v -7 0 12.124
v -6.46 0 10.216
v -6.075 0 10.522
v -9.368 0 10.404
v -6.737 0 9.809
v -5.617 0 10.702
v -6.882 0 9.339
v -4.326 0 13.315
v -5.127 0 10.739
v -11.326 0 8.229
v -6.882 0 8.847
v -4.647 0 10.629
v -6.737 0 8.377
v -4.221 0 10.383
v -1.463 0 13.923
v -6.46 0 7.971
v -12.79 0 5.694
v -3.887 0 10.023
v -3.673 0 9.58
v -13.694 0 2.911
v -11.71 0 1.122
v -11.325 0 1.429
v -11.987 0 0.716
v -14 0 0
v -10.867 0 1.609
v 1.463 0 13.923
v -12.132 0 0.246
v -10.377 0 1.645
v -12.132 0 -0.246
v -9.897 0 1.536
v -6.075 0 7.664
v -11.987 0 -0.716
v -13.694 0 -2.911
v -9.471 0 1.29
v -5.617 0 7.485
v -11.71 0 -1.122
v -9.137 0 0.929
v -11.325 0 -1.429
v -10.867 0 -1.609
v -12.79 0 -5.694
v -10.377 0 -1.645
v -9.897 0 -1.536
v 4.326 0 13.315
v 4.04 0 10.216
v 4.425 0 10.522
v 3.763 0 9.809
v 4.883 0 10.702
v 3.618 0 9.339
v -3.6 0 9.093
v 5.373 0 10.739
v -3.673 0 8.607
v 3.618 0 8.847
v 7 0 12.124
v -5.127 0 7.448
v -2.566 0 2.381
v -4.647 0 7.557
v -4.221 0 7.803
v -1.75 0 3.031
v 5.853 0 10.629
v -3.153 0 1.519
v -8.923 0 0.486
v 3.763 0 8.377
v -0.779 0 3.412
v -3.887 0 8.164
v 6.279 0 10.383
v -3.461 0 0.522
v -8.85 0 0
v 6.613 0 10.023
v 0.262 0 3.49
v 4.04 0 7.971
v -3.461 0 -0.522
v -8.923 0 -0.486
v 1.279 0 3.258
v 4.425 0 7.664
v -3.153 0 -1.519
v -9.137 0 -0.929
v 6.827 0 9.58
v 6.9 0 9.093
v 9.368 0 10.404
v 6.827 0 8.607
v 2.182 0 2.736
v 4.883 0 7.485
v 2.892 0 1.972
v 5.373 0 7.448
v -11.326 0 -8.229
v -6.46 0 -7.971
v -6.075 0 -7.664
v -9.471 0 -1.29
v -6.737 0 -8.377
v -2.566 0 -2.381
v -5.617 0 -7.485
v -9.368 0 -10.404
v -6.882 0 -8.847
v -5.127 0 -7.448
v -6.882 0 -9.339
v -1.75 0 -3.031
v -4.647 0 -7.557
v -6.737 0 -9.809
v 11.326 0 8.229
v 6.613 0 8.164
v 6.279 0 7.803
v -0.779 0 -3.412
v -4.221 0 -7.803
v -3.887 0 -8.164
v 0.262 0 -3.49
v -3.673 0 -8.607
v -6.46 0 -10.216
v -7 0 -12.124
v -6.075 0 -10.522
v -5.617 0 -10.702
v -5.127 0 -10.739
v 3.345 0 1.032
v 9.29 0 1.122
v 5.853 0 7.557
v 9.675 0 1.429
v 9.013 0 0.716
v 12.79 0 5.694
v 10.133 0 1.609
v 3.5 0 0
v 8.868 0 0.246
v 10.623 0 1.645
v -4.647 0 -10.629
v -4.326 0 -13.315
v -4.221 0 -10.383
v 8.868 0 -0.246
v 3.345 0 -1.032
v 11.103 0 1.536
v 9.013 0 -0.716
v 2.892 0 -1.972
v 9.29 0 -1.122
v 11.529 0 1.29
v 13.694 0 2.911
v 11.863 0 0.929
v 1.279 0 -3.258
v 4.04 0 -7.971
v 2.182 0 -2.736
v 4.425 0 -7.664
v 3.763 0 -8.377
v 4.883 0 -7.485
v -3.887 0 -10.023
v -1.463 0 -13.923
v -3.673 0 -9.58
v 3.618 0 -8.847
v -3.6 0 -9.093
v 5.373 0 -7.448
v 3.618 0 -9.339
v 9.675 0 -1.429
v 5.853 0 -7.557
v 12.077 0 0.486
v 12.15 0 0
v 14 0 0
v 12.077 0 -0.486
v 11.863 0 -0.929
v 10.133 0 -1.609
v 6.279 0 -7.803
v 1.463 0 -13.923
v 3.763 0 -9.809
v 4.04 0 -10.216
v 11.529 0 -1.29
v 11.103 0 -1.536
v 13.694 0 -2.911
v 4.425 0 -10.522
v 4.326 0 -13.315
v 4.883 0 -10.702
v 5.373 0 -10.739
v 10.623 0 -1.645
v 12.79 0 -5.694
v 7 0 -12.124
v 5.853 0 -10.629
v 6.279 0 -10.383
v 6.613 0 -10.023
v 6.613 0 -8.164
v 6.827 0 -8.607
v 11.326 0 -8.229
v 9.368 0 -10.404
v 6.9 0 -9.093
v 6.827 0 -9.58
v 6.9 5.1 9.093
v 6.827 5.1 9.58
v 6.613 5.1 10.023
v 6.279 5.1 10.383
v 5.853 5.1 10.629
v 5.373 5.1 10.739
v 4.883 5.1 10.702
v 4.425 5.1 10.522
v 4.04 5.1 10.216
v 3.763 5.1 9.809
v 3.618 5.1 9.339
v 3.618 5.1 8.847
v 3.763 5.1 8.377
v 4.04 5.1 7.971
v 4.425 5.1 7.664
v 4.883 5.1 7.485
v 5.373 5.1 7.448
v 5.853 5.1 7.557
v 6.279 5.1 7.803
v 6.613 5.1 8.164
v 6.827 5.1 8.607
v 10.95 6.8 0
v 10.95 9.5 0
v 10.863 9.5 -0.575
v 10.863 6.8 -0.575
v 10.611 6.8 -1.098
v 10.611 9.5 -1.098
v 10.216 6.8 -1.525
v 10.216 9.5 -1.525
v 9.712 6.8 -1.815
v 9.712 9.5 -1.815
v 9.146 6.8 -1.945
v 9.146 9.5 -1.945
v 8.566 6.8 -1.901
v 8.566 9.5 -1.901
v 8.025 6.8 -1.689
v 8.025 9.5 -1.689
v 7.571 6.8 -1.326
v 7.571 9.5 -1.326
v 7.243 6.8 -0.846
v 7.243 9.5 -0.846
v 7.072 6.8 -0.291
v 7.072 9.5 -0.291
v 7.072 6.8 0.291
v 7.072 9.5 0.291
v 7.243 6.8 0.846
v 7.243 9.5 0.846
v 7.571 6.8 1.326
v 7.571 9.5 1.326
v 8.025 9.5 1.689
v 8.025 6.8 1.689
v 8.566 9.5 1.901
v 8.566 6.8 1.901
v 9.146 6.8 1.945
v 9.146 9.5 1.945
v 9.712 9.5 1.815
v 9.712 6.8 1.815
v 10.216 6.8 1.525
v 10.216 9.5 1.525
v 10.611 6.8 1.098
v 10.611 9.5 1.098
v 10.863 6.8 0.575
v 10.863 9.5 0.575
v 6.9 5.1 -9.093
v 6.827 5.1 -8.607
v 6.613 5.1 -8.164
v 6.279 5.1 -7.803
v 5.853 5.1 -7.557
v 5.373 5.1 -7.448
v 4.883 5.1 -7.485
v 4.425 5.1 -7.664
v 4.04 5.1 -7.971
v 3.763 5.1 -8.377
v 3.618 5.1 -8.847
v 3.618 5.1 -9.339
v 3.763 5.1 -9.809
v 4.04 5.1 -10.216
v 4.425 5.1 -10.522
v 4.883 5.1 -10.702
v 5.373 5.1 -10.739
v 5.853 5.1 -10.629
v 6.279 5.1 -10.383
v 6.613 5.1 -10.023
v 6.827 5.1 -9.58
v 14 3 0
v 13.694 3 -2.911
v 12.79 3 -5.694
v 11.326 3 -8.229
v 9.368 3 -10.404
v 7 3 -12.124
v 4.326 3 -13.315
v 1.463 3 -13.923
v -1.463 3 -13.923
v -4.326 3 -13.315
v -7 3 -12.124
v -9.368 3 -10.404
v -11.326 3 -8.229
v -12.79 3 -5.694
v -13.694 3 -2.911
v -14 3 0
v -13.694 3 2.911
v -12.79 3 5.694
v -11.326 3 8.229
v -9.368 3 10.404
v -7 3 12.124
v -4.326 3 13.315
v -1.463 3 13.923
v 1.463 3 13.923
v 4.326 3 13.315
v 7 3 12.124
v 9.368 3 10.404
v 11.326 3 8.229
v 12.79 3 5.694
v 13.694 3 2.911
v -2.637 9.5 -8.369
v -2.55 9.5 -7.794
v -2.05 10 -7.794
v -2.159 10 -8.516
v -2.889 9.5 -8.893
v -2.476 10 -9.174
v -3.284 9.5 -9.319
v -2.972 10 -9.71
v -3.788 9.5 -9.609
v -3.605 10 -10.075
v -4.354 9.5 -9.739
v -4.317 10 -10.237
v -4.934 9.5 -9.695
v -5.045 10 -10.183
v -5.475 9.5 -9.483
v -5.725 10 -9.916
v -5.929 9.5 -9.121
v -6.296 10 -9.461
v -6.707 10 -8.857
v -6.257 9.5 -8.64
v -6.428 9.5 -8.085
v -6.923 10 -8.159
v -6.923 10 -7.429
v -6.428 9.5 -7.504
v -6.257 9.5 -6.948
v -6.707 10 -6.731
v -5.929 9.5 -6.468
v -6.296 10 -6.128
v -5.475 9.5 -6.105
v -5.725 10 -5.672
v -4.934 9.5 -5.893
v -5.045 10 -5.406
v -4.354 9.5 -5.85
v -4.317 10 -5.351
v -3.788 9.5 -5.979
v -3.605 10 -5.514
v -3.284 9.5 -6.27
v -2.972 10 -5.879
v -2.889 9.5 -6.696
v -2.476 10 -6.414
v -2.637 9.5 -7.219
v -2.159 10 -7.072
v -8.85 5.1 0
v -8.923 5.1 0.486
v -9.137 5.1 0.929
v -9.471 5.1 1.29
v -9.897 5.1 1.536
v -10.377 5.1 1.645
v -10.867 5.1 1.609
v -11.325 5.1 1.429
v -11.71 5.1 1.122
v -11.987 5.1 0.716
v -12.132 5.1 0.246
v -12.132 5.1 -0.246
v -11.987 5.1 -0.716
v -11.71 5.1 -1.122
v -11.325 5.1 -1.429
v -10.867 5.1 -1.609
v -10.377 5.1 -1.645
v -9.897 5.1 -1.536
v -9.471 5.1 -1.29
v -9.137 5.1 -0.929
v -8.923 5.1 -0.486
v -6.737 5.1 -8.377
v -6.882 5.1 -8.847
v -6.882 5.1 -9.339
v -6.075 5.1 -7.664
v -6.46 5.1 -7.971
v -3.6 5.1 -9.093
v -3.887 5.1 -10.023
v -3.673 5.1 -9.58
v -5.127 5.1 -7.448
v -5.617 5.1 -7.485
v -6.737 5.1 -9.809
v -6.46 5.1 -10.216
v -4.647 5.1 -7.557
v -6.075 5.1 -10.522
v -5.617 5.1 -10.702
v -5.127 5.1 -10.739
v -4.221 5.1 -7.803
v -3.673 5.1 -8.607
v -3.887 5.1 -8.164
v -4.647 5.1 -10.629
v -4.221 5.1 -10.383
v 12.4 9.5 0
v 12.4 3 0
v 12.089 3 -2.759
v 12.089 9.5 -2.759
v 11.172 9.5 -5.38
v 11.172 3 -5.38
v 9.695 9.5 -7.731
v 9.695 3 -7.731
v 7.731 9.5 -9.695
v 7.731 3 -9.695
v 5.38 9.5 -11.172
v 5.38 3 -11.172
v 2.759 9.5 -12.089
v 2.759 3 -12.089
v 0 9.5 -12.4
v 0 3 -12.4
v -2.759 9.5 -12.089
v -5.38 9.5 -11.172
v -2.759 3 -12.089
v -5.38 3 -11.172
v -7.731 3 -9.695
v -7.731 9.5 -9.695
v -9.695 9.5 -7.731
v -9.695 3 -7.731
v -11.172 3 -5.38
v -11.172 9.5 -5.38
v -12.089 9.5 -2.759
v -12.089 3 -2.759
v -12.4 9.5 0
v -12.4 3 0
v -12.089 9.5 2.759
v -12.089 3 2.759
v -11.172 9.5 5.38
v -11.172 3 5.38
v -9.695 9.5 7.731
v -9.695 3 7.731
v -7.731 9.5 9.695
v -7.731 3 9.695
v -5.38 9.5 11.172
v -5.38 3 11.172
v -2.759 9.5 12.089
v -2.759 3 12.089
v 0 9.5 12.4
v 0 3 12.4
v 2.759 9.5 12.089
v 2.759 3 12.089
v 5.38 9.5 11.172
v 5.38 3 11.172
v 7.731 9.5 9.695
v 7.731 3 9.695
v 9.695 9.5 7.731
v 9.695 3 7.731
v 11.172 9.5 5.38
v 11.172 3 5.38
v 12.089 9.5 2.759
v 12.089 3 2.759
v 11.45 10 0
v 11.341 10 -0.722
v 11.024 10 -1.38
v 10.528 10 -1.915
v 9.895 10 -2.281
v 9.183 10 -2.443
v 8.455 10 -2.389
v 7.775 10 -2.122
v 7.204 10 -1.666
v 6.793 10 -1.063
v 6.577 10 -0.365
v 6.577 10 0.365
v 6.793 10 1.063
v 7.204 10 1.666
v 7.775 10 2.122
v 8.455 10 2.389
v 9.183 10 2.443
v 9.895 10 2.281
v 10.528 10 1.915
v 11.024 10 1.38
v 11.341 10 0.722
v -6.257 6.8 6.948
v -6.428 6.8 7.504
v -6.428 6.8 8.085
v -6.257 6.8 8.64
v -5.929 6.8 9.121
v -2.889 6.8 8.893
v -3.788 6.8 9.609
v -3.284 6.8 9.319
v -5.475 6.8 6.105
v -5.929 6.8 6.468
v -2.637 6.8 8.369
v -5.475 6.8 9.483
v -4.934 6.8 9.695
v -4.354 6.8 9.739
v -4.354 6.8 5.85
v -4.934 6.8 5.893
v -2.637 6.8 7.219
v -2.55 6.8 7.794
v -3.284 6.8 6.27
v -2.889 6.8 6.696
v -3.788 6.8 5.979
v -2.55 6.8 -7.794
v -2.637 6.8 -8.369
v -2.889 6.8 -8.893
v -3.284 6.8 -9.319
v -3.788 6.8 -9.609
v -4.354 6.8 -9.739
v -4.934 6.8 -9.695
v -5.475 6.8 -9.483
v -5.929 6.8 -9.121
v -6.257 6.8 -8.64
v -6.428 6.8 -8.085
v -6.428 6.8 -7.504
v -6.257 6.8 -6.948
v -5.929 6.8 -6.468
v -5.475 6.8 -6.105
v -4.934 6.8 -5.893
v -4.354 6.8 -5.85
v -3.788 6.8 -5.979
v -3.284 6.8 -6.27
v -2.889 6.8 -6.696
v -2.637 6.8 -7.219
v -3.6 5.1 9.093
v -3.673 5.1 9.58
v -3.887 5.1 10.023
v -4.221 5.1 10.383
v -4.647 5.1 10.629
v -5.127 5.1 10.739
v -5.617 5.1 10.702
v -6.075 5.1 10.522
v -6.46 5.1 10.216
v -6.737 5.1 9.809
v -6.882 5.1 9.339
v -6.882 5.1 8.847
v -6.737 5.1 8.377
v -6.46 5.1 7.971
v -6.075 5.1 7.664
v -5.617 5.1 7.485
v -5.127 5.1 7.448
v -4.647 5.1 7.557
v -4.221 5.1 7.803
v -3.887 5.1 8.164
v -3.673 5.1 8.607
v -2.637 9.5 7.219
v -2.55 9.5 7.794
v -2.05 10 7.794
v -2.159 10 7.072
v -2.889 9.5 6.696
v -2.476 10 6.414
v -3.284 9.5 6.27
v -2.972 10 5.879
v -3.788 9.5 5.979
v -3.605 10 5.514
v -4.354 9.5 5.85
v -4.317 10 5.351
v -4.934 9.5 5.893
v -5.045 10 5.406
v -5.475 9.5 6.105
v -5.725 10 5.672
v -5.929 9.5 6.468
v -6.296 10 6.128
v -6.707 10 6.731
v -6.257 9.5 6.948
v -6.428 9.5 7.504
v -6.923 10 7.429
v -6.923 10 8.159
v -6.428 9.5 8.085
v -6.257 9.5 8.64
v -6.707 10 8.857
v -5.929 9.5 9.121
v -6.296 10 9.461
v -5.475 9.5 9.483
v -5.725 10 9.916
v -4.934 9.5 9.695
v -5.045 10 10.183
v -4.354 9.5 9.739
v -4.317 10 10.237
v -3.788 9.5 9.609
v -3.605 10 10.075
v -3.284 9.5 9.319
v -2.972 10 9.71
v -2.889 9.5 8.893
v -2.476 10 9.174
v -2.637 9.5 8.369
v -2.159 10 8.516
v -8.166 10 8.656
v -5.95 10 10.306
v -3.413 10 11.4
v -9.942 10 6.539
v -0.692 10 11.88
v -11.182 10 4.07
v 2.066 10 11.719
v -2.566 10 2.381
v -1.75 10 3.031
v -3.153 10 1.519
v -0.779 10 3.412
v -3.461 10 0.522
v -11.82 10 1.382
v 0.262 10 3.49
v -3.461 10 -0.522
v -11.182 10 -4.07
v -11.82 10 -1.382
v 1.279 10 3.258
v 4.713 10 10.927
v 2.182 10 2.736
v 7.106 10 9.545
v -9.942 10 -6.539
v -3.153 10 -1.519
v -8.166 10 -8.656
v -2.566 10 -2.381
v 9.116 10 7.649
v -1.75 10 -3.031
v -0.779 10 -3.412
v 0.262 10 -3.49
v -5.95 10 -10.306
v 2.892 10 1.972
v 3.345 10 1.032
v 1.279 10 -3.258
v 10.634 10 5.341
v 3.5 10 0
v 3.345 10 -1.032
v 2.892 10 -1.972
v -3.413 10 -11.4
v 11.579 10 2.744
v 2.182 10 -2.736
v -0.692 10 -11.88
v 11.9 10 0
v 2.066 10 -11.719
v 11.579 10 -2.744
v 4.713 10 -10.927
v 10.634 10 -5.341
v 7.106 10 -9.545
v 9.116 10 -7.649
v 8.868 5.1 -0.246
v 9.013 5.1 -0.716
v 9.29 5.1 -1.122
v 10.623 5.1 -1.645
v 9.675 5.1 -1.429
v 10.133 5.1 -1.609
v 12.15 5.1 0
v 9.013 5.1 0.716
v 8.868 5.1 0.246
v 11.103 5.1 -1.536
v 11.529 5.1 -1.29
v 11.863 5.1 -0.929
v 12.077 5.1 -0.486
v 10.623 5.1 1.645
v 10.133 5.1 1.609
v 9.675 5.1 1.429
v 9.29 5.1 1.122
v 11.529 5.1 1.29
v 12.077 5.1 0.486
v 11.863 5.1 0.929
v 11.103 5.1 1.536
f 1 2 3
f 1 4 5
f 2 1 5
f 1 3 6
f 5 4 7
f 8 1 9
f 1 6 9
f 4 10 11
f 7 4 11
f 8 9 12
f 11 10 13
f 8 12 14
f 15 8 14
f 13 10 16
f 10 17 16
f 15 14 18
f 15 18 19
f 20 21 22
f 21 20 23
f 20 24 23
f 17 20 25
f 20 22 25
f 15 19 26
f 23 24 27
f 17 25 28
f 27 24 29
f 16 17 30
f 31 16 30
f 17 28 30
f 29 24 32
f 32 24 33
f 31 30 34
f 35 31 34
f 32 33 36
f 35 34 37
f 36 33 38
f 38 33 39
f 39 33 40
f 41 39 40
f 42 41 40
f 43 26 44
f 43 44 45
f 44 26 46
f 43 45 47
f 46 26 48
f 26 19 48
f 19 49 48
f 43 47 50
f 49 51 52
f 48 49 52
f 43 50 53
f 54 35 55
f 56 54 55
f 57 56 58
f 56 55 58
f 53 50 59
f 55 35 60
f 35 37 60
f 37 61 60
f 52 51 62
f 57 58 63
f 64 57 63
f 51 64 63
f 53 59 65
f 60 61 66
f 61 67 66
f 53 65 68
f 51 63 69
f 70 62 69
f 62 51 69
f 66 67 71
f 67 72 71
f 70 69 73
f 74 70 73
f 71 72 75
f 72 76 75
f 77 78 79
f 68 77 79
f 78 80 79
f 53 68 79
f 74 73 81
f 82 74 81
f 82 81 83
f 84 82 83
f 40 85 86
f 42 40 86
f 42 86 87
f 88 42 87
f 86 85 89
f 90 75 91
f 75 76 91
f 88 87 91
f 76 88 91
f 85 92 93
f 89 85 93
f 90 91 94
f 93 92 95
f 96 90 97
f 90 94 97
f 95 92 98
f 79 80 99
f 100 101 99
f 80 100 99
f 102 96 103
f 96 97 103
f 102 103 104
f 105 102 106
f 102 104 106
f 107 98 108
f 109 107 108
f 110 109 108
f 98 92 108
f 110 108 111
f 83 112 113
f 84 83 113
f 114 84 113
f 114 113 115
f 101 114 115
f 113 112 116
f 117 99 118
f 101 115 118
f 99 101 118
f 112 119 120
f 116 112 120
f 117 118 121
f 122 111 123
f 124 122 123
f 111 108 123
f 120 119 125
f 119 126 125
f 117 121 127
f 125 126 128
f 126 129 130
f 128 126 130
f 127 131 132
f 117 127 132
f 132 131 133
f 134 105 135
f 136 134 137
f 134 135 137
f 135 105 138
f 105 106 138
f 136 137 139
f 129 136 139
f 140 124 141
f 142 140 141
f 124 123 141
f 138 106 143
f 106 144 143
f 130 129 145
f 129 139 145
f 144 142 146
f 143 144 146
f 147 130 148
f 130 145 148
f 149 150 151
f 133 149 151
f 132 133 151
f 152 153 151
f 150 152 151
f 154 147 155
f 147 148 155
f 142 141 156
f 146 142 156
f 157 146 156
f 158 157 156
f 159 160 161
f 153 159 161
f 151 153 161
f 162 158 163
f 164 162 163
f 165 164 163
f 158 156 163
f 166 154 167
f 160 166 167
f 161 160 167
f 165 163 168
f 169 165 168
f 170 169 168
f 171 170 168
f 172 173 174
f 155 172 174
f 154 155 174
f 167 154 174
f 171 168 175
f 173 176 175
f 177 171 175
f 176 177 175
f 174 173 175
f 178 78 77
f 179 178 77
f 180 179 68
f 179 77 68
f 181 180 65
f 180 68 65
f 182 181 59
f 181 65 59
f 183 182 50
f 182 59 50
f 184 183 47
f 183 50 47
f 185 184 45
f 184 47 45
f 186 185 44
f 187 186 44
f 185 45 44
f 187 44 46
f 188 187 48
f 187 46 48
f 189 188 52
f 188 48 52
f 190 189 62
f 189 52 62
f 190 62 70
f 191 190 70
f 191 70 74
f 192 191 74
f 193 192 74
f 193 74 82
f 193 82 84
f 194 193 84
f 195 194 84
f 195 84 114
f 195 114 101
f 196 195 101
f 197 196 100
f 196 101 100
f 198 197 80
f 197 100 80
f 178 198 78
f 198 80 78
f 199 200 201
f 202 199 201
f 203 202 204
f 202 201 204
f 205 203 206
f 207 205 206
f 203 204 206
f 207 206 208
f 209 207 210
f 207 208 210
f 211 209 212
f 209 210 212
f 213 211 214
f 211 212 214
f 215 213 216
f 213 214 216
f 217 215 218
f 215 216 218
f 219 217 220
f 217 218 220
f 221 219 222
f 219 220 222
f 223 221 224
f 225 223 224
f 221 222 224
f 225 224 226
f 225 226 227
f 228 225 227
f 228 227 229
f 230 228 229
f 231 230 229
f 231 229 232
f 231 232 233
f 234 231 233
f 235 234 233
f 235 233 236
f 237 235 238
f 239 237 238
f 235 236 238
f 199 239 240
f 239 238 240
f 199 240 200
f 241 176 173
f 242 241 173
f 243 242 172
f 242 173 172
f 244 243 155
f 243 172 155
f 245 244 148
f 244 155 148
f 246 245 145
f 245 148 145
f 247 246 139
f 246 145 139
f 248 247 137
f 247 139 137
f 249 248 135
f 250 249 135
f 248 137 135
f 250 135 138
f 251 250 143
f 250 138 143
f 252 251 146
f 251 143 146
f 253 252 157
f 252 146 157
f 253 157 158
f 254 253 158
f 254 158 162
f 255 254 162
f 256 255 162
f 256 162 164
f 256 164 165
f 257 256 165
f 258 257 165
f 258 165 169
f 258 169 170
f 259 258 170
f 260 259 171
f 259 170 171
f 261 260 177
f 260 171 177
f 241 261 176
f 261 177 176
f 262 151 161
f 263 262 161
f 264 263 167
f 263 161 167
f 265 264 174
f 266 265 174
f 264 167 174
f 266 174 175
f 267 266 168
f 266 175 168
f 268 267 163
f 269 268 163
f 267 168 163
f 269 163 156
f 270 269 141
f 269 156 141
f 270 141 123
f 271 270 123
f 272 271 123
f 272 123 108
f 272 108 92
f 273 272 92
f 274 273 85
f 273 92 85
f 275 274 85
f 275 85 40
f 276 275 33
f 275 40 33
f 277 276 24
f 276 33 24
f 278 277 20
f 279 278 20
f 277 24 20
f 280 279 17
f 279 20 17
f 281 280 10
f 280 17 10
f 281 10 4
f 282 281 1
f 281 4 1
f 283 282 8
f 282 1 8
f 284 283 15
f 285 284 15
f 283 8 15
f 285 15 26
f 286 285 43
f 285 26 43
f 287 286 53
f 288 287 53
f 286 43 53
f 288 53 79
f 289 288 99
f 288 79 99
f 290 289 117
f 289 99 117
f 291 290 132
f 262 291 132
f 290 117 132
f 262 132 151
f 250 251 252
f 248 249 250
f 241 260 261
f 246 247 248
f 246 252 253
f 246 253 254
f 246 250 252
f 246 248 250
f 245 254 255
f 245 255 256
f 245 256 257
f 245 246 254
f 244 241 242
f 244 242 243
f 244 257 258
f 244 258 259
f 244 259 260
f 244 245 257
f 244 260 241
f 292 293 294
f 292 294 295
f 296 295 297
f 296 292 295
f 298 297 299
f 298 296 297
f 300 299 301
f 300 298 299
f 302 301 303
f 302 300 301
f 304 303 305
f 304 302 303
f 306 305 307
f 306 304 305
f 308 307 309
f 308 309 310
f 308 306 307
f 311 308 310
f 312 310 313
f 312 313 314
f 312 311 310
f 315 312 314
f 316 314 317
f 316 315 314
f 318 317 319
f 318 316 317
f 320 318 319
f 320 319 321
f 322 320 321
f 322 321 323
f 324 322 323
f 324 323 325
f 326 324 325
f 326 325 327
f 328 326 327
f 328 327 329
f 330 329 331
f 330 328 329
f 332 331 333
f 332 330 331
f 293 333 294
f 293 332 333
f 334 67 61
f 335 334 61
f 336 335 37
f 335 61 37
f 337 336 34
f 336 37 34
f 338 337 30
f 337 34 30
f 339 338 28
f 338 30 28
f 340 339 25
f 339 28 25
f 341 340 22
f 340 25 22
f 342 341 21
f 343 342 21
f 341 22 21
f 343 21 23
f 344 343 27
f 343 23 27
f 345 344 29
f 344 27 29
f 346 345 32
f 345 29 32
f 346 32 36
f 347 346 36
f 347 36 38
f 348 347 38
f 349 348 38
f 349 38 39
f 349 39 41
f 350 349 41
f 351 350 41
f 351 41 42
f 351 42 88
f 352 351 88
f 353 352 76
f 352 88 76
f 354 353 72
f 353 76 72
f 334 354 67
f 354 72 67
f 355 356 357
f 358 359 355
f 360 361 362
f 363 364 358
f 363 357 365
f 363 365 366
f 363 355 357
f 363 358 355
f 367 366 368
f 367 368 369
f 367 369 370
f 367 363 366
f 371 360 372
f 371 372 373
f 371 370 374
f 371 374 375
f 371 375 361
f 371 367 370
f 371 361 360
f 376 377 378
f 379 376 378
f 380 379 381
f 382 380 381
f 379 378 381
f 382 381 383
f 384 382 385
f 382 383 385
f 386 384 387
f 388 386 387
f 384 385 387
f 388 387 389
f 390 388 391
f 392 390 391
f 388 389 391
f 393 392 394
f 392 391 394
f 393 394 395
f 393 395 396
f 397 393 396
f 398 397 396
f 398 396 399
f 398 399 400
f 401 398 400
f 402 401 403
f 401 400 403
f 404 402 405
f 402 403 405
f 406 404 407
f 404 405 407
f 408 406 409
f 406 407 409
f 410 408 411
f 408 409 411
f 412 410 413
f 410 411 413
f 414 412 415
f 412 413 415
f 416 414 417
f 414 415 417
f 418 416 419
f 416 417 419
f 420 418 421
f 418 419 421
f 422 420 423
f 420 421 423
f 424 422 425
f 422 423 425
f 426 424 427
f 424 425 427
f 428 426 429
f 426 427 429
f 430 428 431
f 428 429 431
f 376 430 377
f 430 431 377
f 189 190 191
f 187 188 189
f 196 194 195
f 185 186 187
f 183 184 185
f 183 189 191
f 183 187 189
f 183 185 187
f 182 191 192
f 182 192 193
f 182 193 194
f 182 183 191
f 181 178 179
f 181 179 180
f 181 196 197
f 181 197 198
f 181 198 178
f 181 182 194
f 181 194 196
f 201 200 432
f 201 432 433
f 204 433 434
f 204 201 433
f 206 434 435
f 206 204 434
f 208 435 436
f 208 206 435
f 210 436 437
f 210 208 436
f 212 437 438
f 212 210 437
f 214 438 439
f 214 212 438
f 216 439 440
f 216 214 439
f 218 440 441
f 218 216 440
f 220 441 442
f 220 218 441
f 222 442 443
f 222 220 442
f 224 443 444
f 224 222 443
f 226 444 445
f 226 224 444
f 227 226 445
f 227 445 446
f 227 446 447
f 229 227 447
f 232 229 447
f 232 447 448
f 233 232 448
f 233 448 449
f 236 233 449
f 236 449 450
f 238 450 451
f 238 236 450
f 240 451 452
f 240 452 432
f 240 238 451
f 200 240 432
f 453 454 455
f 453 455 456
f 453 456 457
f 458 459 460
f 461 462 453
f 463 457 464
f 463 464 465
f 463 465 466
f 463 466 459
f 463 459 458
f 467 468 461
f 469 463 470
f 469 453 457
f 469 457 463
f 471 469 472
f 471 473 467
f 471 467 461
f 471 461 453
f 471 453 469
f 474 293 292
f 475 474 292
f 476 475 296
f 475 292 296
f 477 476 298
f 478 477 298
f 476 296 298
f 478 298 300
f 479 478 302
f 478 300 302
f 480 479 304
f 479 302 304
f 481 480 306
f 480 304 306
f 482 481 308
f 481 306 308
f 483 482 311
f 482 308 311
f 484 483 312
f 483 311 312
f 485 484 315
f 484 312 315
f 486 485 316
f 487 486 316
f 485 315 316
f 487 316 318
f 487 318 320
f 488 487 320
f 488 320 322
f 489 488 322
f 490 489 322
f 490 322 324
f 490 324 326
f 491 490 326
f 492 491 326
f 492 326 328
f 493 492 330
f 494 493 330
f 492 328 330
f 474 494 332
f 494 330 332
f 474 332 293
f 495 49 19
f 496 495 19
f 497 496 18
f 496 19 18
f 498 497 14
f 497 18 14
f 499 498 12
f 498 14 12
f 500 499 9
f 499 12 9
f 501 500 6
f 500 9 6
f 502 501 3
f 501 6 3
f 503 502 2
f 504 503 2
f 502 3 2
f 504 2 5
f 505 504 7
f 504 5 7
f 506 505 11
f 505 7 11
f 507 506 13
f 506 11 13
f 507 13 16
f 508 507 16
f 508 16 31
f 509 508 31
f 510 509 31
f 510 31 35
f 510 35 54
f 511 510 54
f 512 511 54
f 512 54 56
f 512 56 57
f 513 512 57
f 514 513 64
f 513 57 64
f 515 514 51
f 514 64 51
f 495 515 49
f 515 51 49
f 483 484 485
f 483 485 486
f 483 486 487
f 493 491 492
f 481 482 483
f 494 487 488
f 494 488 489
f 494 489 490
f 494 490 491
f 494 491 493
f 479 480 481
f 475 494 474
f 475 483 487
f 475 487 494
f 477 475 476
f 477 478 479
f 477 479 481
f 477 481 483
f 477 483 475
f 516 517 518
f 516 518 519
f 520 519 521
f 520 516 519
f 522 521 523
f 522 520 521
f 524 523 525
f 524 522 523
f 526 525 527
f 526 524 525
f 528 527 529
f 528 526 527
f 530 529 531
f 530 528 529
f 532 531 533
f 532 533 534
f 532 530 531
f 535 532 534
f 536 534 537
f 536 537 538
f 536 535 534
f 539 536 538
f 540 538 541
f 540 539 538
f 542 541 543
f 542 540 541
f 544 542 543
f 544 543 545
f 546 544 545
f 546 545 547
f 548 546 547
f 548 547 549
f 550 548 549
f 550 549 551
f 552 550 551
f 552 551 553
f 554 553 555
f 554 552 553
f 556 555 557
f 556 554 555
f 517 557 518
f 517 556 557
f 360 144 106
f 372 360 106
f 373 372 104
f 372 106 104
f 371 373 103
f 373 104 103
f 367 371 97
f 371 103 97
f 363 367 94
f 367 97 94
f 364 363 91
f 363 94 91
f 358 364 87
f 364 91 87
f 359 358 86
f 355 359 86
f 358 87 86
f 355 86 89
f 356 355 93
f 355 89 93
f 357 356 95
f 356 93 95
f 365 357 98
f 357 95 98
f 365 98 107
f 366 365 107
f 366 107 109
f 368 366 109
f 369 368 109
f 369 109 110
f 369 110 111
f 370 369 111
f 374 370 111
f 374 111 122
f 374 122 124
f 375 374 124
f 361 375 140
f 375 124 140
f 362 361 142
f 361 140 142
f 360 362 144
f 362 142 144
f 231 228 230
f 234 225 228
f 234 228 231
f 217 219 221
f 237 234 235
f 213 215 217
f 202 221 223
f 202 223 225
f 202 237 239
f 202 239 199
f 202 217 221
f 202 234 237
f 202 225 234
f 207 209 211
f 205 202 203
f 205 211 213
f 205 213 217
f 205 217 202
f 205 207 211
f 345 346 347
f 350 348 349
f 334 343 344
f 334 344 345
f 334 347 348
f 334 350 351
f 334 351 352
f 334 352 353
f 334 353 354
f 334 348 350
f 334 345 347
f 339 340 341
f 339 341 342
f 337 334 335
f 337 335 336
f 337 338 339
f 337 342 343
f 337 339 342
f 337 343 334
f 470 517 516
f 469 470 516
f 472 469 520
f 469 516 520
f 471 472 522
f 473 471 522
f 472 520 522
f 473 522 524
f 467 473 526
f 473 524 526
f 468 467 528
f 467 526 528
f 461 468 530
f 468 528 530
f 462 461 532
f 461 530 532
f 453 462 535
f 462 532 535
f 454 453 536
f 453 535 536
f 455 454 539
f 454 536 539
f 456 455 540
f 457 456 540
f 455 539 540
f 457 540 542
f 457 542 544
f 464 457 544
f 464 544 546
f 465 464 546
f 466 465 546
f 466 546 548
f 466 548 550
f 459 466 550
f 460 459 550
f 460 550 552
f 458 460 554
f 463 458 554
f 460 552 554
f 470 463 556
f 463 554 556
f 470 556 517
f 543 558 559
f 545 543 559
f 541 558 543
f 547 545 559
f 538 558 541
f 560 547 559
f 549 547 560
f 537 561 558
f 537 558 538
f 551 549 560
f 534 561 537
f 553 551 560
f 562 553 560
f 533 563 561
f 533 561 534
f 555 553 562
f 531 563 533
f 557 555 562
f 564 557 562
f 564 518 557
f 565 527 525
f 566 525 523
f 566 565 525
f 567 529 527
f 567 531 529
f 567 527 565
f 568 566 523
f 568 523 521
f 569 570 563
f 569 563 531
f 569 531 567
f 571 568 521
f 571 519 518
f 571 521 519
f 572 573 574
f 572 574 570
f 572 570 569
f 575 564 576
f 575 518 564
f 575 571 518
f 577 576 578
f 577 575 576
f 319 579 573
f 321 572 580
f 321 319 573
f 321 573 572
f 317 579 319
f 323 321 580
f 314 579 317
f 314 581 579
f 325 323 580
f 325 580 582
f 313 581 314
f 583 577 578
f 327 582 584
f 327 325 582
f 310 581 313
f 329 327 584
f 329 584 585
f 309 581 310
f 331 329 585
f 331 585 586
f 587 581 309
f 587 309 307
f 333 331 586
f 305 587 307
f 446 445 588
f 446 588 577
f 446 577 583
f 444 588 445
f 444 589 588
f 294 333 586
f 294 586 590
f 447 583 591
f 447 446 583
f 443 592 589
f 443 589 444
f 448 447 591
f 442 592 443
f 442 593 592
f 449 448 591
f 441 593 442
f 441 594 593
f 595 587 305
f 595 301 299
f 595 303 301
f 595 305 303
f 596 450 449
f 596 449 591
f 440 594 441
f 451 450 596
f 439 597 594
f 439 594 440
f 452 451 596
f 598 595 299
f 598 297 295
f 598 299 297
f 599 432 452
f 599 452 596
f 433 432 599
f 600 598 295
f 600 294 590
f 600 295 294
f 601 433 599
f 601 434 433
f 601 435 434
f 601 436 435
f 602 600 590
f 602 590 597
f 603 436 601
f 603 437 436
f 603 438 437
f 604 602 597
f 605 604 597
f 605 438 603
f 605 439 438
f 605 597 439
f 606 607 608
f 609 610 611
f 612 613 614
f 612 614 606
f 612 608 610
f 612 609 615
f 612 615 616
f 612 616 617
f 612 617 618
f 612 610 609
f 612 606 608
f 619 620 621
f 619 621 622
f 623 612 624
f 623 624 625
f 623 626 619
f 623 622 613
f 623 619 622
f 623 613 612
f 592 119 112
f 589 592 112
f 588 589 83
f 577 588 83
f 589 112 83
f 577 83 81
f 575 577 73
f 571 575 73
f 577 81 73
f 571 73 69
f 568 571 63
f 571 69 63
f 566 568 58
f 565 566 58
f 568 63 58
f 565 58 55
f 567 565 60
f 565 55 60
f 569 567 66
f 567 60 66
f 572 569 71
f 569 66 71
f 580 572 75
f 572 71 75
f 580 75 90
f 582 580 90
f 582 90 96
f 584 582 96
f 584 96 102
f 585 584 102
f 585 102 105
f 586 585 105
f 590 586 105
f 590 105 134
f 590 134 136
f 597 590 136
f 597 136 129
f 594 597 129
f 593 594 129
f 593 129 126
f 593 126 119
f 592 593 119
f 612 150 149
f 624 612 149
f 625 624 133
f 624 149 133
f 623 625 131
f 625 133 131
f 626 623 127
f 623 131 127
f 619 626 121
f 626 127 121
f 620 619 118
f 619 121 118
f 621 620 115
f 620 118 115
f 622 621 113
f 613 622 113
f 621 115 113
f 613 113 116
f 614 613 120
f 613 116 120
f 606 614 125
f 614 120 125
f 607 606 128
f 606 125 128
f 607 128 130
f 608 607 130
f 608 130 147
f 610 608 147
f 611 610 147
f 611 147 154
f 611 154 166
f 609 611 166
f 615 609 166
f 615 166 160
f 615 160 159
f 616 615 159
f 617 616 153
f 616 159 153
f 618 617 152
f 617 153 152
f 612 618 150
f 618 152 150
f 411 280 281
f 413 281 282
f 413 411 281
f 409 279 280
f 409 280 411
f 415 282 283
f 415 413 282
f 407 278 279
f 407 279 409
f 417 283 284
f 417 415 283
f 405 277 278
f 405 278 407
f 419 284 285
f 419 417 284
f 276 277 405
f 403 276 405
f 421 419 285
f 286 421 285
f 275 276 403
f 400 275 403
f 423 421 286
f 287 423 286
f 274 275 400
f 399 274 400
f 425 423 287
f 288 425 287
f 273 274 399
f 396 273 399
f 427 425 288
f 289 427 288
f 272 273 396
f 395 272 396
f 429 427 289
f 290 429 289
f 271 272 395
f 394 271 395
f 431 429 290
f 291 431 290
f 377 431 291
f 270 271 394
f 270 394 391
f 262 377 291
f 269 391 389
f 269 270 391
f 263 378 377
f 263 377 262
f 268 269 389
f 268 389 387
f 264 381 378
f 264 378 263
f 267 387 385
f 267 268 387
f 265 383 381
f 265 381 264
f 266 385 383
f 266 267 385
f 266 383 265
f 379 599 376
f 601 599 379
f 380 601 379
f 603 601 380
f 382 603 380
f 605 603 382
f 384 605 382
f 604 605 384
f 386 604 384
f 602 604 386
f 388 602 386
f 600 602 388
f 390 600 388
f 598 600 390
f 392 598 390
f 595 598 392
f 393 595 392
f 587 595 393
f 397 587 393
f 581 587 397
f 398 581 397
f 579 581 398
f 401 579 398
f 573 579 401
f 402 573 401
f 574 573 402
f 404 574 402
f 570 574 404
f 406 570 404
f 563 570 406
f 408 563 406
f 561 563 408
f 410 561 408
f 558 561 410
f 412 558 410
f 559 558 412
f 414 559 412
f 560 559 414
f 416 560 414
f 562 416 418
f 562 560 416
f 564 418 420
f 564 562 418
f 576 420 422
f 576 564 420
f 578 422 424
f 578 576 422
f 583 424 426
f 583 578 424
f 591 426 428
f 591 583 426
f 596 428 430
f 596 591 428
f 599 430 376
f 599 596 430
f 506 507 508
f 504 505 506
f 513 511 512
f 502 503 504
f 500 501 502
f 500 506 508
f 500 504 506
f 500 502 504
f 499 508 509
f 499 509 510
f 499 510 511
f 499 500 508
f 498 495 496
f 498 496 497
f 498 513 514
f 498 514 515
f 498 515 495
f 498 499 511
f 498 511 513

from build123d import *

# Parameters (mm, degrees)
SKETCH_1_R          = 14
EXTRUDE_1_DEPTH     = 3
SKETCH_2_R          = 12.4
EXTRUDE_2_DEPTH     = 7
SKETCH_3_R          = 1.65
CUT_EXTRUDE_1_DEPTH = 5.1
SKETCH_4_R          = 3.5
CUT_EXTRUDE_2_DEPTH = 11
SKETCH_6_R          = 1.95
CUT_EXTRUDE_4_DEPTH = 3.2
CHAMFER_1_SIZE      = 0.5


with BuildPart() as part:
    # 草图1 → 凸台-拉伸1 (new body)
    with BuildSketch(Plane(origin=(0, 0, 0), x_dir=(1, 0, 0), z_dir=(0, 1, 0))):
        Circle(SKETCH_1_R)
    extrude(amount=EXTRUDE_1_DEPTH)

    # 草图2 → 凸台-拉伸2 (add)
    with BuildSketch(Plane(origin=(0, 3, 0), x_dir=(1, 0, 0), z_dir=(0, 1, 0))):
        Circle(SKETCH_2_R)
    extrude(amount=EXTRUDE_2_DEPTH)

    # 草图3 → 切除-拉伸1 (cut)
    with BuildSketch(Plane.XZ):
        with Locations((10.5, 0)):
            Circle(SKETCH_3_R)
        with Locations((5.25, -9.09326674)):
            Circle(SKETCH_3_R)
        with Locations((-5.25, -9.09326674)):
            Circle(SKETCH_3_R)
        with Locations((-10.5, 0)):
            Circle(SKETCH_3_R)
        with Locations((-5.25, 9.09326674)):
            Circle(SKETCH_3_R)
        with Locations((5.25, 9.09326674)):
            Circle(SKETCH_3_R)
    extrude(amount=-CUT_EXTRUDE_1_DEPTH, mode=Mode.SUBTRACT)

    # 草图4 → 切除-拉伸2 (cut, through all)
    with BuildSketch(Plane.XZ):
        Circle(SKETCH_4_R)
    extrude(amount=-CUT_EXTRUDE_2_DEPTH, mode=Mode.SUBTRACT)

    # 草图6 → 切除-拉伸4 (cut)
    with BuildSketch(Plane(origin=(0, 10, 0), x_dir=(1, 0, 0), z_dir=(0, 1, 0))):
        with Locations((9, 0)):
            Circle(SKETCH_6_R)
        with Locations((-4.5, -7.794228634)):
            Circle(SKETCH_6_R)
        with Locations((-4.5, 7.794228634)):
            Circle(SKETCH_6_R)
    extrude(amount=-CUT_EXTRUDE_4_DEPTH, mode=Mode.SUBTRACT)

    # 倒角1
    chamfer_1_edges = [part.edges().sort_by_distance(p)[0] for p in [
        (7.05, 10, 0),
        (-6.45, 10, 7.794228634),
        (-6.45, 10, -7.794228634),
        (-12.4, 10, 0),
    ]]
    chamfer(chamfer_1_edges, length=CHAMFER_1_SIZE)


solid = part.part
